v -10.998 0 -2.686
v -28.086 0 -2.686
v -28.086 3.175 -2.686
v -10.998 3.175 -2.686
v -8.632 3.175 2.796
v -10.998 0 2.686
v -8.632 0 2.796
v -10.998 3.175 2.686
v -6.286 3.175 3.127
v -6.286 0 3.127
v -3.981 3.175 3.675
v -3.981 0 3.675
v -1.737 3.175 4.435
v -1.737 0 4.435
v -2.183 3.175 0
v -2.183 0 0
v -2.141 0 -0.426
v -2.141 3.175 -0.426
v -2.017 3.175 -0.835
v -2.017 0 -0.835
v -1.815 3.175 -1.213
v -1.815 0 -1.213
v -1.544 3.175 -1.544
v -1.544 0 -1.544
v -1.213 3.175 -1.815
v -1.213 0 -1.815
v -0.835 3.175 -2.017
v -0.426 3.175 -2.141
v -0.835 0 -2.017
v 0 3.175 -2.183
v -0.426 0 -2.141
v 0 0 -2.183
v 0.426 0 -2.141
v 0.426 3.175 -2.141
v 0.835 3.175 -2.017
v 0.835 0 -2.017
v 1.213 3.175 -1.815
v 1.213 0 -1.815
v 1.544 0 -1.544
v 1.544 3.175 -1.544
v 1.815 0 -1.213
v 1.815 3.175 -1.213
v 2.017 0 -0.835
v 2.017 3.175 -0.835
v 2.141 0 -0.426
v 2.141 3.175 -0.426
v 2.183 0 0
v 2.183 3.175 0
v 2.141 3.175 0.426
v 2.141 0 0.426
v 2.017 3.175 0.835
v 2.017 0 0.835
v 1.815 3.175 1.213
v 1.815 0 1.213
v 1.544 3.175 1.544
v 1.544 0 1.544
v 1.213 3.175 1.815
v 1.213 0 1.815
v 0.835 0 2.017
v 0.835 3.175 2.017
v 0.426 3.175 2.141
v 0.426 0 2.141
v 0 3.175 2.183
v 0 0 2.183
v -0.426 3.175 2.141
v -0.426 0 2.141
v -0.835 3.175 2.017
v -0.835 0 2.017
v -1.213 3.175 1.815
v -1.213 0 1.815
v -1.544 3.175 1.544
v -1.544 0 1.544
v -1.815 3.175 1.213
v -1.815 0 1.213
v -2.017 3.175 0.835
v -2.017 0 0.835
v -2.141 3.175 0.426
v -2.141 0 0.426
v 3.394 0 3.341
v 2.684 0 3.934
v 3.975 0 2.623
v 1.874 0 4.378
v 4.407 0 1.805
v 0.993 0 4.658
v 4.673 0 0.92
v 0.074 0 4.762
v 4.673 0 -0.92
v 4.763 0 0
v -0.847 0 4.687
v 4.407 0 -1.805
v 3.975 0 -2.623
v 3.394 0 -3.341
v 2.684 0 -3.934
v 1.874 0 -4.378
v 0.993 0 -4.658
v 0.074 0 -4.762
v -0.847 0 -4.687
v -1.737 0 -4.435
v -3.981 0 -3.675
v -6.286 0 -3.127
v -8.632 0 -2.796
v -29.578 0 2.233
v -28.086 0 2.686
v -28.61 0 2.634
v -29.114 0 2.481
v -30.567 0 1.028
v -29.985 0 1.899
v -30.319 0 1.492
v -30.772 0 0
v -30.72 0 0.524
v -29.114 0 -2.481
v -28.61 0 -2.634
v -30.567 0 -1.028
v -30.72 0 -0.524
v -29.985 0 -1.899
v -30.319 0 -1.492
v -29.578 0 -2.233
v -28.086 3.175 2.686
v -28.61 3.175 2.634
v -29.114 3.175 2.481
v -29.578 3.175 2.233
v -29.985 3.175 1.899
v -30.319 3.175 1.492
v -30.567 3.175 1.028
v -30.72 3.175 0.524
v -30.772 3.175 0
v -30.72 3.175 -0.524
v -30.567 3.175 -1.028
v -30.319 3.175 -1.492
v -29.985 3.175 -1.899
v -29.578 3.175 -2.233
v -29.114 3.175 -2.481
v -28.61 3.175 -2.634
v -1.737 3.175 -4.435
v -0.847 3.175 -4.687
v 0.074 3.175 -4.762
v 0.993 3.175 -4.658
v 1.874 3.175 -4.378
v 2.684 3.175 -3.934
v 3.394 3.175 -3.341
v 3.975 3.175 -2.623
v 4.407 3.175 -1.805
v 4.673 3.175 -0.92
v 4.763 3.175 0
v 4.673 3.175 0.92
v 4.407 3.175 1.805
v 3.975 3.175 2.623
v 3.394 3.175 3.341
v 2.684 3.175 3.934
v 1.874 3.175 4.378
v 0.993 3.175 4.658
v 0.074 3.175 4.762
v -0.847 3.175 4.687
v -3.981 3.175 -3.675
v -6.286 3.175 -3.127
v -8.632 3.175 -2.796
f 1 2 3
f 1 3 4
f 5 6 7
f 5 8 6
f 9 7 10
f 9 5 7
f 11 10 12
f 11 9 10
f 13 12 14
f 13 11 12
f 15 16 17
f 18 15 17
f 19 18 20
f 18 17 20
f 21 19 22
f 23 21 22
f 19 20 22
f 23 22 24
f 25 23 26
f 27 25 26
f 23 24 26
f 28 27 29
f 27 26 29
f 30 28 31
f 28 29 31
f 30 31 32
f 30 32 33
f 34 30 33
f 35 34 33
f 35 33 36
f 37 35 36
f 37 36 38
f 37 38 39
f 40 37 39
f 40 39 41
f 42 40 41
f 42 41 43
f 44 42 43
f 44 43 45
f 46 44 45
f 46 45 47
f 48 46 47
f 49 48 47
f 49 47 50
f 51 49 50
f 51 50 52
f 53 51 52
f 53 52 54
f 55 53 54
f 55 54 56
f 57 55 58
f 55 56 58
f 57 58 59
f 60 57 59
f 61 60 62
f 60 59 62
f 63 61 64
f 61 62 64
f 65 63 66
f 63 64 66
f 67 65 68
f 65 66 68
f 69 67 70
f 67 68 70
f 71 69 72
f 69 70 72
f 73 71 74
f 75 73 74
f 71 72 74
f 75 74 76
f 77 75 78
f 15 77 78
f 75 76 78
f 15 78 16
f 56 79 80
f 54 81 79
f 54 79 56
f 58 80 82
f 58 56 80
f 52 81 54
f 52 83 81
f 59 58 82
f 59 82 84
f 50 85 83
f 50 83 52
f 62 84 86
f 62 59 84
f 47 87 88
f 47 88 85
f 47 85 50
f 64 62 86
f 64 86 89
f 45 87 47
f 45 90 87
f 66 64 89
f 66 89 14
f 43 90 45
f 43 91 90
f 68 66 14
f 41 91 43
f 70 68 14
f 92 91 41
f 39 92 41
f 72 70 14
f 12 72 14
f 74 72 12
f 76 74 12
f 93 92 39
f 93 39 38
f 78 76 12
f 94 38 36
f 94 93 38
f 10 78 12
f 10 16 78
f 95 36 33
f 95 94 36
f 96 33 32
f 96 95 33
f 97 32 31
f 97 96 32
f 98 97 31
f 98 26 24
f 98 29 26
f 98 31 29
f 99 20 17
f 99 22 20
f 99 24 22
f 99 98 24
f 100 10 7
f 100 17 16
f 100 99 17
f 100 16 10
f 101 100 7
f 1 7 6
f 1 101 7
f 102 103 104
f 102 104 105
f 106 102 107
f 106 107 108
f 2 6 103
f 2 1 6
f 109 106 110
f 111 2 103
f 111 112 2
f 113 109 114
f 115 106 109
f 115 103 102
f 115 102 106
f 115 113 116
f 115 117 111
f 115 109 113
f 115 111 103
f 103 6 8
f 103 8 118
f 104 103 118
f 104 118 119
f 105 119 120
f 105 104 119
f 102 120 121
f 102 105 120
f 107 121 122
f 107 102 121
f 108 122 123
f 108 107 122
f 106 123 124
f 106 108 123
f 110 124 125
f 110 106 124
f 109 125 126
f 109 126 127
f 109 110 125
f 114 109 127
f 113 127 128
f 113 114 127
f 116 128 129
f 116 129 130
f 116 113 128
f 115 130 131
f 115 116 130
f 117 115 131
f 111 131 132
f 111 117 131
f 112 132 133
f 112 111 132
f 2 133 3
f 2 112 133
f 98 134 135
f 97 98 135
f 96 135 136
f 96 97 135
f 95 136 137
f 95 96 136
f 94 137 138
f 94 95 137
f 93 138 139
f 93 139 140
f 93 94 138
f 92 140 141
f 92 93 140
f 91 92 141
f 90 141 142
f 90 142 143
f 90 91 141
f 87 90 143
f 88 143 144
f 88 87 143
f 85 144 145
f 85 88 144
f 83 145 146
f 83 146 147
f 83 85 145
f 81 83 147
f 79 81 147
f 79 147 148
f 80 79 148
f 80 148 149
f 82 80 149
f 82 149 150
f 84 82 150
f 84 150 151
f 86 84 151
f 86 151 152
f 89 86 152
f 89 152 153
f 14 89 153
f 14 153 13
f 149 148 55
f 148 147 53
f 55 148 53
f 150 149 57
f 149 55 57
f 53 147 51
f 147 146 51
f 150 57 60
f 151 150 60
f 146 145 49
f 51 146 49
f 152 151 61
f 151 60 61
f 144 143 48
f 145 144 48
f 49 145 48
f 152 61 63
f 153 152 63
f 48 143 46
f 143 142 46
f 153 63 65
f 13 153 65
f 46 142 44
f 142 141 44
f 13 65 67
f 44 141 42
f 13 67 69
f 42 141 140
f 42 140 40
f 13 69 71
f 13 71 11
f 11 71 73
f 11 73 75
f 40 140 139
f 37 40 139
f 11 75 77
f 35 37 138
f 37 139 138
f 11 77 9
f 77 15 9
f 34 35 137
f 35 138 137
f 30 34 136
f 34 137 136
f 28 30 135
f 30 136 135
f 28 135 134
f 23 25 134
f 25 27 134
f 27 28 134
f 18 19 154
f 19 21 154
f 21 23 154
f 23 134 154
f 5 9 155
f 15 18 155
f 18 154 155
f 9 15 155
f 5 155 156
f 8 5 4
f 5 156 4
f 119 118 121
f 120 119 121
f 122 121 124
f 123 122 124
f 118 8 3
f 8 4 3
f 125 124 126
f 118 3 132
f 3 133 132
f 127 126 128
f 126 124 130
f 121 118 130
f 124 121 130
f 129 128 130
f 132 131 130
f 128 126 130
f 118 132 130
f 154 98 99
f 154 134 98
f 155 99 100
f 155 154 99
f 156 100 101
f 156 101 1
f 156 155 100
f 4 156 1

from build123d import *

# Parameters (mm, degrees)
BOSS_EXTRUDE1_DEPTH              = 3.175
F_11_64_0_17188_DIAMETER_HOLE1_D = 4.365752
FILLET1_R                        = 25.4


with BuildPart() as part:
    # Sketch1 → Boss-Extrude1 (new body)
    with BuildSketch(Plane(origin=(0, 0, 0), x_dir=(1, 0, 0), z_dir=(0, 1, 0))):
        with BuildLine():
            Line((-3.932886418, -2.685853807), (-25.4, -2.685853807))
            Line((-25.4, -2.685853807), (-28.085853807, -2.685853807))
            ThreePointArc((-28.085853807, -2.685853807), (-30.771707615, 0), (-28.085853807, 2.685853807))
            Line((-28.085853807, 2.685853807), (-25.4, 2.685853807))
            Line((-25.4, 2.685853807), (-3.932886418, 2.685853807))
            ThreePointArc((-3.932886418, 2.685853807), (4.7625, 0), (-3.932886418, -2.685853807))
        make_face()
    extrude(amount=BOSS_EXTRUDE1_DEPTH)

    # 11/64 (0.17188) Diameter Hole1 (through all)
    with Locations(Plane(origin=(0, 3.175, 0), x_dir=(1, 0, 0), z_dir=(0, 1, 0))):
        with Locations((0, 0)):
            Hole(F_11_64_0_17188_DIAMETER_HOLE1_D / 2)

    # Fillet1
    fillet1_edges = [part.edges().sort_by_distance(p)[0] for p in [
        (-3.932886418, 1.5875, -2.685853807),
        (-3.932886418, 1.5875, 2.685853807),
    ]]
    fillet(fillet1_edges, radius=FILLET1_R)


solid = part.part
